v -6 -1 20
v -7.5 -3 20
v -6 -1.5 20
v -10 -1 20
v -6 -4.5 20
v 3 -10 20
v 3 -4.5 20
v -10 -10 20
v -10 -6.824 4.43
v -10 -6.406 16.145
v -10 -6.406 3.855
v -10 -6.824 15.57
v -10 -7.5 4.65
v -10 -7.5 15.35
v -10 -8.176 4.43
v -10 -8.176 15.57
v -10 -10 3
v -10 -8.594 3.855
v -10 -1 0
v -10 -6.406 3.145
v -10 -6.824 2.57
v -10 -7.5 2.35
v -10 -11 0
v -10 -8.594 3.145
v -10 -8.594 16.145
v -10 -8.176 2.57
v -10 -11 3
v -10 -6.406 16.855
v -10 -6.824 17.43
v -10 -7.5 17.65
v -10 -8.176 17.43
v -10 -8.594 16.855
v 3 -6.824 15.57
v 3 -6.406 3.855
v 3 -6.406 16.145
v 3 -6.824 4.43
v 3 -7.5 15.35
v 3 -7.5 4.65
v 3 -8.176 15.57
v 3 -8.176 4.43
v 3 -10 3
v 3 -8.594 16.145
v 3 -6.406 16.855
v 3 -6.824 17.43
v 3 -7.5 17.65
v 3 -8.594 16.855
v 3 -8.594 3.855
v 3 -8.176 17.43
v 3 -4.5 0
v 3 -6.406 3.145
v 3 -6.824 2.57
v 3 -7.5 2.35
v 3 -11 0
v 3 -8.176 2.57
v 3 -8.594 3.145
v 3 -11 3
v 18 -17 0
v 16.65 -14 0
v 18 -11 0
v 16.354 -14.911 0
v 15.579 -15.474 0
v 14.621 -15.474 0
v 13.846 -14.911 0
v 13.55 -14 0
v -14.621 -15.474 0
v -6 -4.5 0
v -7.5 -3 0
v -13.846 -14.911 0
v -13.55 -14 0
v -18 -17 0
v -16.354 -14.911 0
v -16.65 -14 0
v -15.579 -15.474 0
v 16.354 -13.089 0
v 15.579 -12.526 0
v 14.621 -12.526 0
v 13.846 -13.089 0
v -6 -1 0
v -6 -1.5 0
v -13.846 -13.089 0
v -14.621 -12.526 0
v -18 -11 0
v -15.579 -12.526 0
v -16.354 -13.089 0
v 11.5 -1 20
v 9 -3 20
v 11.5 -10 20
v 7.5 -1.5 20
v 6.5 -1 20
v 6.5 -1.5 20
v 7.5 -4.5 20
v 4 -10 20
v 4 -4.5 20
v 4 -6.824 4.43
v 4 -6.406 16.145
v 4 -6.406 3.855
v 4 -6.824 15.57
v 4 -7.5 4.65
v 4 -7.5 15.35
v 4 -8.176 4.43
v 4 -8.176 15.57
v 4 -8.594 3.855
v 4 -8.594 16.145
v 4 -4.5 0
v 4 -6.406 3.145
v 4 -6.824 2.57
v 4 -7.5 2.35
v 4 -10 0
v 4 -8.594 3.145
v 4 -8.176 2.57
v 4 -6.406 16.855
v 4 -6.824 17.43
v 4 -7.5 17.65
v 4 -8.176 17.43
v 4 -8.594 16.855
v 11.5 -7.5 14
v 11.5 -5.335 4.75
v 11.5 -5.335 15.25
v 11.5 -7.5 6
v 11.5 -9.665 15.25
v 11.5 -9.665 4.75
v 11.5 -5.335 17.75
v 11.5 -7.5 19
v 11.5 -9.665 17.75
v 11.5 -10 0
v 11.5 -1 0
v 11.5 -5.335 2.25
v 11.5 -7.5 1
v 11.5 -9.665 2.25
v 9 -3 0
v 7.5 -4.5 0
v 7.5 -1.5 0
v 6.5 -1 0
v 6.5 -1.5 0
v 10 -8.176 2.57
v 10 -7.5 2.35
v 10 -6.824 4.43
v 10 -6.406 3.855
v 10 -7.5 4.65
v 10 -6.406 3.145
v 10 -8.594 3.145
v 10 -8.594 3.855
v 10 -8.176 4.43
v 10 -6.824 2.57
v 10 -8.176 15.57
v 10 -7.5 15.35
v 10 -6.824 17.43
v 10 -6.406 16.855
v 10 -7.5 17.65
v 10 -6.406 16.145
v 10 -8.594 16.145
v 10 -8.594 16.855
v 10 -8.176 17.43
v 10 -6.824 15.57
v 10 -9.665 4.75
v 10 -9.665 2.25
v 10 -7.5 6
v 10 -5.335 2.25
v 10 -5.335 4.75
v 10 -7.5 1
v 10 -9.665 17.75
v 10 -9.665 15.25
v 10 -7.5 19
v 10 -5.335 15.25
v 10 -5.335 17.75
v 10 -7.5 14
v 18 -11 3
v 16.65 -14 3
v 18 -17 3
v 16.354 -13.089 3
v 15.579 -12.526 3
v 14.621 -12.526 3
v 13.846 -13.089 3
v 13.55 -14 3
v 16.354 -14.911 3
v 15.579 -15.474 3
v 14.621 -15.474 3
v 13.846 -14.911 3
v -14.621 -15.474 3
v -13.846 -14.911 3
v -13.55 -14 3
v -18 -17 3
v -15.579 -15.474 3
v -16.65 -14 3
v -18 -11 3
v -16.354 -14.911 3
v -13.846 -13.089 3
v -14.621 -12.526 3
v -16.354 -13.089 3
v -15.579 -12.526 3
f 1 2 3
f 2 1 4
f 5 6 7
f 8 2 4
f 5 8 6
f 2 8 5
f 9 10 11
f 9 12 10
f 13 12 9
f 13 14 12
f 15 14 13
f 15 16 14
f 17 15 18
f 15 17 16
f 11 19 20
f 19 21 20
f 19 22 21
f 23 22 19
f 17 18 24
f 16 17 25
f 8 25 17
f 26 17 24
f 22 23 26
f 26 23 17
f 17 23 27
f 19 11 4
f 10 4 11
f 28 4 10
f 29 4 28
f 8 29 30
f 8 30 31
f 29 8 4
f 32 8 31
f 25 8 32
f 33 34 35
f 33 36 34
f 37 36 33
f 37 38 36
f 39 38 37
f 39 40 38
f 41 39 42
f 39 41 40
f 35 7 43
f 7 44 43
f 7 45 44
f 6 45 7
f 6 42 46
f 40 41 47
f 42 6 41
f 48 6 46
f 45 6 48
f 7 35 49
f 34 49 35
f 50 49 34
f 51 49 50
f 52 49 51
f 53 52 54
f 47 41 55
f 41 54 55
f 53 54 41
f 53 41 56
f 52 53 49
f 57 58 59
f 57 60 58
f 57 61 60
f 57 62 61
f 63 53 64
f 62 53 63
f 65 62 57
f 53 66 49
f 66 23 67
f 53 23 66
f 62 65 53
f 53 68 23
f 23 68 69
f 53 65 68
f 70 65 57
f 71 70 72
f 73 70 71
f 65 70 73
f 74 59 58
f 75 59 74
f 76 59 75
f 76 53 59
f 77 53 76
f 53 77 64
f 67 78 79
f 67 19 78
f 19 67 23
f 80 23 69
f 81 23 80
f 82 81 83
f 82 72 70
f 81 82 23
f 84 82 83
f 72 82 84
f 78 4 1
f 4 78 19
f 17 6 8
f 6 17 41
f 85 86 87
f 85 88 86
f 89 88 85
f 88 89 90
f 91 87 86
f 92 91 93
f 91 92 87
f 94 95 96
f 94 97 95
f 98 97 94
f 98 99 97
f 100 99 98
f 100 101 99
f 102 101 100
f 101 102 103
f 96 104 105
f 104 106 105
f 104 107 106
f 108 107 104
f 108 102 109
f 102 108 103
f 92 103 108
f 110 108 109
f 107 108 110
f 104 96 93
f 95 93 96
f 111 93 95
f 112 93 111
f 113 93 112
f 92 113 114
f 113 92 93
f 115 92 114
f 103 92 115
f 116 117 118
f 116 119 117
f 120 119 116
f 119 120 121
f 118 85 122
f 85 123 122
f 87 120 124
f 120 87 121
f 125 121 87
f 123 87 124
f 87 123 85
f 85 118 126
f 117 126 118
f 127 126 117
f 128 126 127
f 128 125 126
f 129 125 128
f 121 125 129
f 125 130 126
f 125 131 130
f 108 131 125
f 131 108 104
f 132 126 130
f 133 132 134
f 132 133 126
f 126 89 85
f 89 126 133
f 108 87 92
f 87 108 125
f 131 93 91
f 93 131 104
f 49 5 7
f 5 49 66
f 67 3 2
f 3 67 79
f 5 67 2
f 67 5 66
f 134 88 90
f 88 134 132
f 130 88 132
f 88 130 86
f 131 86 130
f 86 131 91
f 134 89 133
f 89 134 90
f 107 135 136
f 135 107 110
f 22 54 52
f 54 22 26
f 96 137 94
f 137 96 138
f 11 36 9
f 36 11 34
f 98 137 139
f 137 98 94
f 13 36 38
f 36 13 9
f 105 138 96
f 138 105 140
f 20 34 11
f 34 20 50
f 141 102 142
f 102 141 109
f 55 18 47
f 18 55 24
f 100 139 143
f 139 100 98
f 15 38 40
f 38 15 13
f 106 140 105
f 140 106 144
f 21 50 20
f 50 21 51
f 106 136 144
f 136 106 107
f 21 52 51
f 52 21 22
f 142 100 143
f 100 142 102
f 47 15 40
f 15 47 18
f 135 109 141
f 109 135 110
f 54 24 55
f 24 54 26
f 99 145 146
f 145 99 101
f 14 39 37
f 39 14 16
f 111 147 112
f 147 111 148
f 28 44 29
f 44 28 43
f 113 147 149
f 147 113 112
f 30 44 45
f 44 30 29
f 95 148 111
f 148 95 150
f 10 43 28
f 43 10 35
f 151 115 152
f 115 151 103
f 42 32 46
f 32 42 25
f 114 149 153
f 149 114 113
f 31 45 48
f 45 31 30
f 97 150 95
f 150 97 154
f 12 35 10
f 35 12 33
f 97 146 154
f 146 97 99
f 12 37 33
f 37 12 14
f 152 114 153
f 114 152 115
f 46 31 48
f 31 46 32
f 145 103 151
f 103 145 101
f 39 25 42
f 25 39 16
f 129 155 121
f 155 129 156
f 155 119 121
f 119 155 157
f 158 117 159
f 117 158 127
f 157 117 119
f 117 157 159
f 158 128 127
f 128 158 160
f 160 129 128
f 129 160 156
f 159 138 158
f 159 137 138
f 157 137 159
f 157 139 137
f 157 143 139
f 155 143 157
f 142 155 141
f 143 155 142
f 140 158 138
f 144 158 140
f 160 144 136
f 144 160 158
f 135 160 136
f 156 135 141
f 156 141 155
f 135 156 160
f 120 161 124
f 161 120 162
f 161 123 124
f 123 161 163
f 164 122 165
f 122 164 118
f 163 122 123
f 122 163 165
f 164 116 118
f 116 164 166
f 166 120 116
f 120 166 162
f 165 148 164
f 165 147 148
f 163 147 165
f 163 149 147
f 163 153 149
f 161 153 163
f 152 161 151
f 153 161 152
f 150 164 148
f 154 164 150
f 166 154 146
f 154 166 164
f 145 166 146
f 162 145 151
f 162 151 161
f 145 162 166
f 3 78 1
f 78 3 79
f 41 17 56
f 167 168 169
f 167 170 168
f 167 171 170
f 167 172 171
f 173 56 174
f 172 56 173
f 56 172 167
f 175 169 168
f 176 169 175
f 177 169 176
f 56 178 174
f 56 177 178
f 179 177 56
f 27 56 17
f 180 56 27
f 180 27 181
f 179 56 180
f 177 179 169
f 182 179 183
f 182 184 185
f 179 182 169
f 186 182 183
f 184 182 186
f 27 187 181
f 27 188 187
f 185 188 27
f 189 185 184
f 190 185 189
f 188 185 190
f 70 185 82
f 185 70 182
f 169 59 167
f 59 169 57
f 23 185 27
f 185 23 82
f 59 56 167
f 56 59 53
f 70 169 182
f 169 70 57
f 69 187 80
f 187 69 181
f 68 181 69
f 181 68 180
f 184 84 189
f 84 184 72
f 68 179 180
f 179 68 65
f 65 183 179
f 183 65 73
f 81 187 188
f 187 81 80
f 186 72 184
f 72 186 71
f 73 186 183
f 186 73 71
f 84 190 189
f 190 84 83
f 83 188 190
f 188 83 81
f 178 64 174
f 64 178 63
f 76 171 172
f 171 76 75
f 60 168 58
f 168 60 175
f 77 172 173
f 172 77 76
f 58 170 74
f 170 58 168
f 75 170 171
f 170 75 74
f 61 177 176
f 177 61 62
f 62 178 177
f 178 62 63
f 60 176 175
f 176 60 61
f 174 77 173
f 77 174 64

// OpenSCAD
// file: lib/railSystem.scad
module rail($length, $spacing = true){
    $height = 15;
    $partWidth = 5;
    
    translate([0,-3,0]){
        difference(){
            translate([0,-1.5,-$height/2]) cube([$length,3,$height]);
            translate([0,0,$height/2])rotate([-45,0,0])cube([$length,10,10]);
            mirror([0,1,0])translate([0,0,$height/2])rotate([-45,0,0])cube([$length,10,10]);   
           
            translate([0,0,-$height/2])rotate([-45,0,0])cube([$length,10,10]);
            mirror([0,1,0])translate([0,0,-$height/2])rotate([-45,0,0])cube([$length,10,10]);  
            
            
    if($spacing)        
         for(i = [$partWidth : $partWidth * 2 : $length]){
            rotate([180,0,0])translate([i,0.5,-$height/2])cube([$partWidth,50,$height]);
        }
            
        }
        

        
        translate([0,0,-$height*1/(1.5*2)])cube([$length,3,$height/1.5]);
    }
}


module railMount($width, $onlyPart = 0){
    difference(){
        union(){
    
            if($onlyPart!=1)translate([0,-10,-3])cube([$width,9,13]);
            if($onlyPart!=2)translate([0,-10,-11.5])cube([$width,9,7.5]);
        }
    
    translate([-1,0,0])rail($width + 2, false);
    translate([-1,0,-1.5])rail($width + 2, false);
        
    translate([3.5,-7.5,-15])
        cylinder(d=2.3,50, $fn=10);
    translate([$width - 3.5,-7.5,-15])
        cylinder(d=2.3,50, $fn=10);
    translate([3.5,-7.5,-11.6])cylinder(d=5,1.6,$fn=6);
    translate([$width - 3.5,-7.5,-11.6])cylinder(d=5,1.6,$fn=6);
            
    translate([-1,-2,-6])cube([$width + 2,2,12]);
    }
}
// main file
include <lib/railSystem.scad>;

module IDScamMountHor(){
    rotate([0,-90,0])
    difference(){
        union(){
            railMount(20);
            translate([0,-17,-36/2])cube([3,6,36]);
            translate([0,-16,-3])cube([3,6,13]);
        }
        //Mounting holes
        translate([-1,-14,15.1])rotate([0,90,0])cylinder(d=3.1, 20, $fn=10);
        translate([-1,-14,-15.1])rotate([0,90,0])cylinder(d=3.1, 20, $fn=10);
        translate([-1,-54,-12])cube([5,36,24]);
     
    }
}

module IDScamMountVer(){
    
    translate([13,0,10])rotate([0,90,0])railMount(20,1);
    rotate([0,180,0])
    difference(){
        union(){
            railMount(20,2);
            translate([20/2,0,7])
            rotate([0,-90,0]){
                translate([0,-17,-36/2])cube([3,6,36]);
                translate([0,-16,-20/2])cube([3,6,20]);
            }
        }
        //Mounting holes
        translate([20/2,0,7])
        rotate([0,-90,0]){
            translate([-1,-14,15.1])rotate([0,90,0])cylinder(d=3.1, 20, $fn=10);
            translate([-1,-14,-15.1])rotate([0,90,0])cylinder(d=3.1, 20, $fn=10);
            translate([-1,-54,-12])cube([5,36,24]);
        }
    }
}


//IDScamMountVer();
IDScamMountHor();
